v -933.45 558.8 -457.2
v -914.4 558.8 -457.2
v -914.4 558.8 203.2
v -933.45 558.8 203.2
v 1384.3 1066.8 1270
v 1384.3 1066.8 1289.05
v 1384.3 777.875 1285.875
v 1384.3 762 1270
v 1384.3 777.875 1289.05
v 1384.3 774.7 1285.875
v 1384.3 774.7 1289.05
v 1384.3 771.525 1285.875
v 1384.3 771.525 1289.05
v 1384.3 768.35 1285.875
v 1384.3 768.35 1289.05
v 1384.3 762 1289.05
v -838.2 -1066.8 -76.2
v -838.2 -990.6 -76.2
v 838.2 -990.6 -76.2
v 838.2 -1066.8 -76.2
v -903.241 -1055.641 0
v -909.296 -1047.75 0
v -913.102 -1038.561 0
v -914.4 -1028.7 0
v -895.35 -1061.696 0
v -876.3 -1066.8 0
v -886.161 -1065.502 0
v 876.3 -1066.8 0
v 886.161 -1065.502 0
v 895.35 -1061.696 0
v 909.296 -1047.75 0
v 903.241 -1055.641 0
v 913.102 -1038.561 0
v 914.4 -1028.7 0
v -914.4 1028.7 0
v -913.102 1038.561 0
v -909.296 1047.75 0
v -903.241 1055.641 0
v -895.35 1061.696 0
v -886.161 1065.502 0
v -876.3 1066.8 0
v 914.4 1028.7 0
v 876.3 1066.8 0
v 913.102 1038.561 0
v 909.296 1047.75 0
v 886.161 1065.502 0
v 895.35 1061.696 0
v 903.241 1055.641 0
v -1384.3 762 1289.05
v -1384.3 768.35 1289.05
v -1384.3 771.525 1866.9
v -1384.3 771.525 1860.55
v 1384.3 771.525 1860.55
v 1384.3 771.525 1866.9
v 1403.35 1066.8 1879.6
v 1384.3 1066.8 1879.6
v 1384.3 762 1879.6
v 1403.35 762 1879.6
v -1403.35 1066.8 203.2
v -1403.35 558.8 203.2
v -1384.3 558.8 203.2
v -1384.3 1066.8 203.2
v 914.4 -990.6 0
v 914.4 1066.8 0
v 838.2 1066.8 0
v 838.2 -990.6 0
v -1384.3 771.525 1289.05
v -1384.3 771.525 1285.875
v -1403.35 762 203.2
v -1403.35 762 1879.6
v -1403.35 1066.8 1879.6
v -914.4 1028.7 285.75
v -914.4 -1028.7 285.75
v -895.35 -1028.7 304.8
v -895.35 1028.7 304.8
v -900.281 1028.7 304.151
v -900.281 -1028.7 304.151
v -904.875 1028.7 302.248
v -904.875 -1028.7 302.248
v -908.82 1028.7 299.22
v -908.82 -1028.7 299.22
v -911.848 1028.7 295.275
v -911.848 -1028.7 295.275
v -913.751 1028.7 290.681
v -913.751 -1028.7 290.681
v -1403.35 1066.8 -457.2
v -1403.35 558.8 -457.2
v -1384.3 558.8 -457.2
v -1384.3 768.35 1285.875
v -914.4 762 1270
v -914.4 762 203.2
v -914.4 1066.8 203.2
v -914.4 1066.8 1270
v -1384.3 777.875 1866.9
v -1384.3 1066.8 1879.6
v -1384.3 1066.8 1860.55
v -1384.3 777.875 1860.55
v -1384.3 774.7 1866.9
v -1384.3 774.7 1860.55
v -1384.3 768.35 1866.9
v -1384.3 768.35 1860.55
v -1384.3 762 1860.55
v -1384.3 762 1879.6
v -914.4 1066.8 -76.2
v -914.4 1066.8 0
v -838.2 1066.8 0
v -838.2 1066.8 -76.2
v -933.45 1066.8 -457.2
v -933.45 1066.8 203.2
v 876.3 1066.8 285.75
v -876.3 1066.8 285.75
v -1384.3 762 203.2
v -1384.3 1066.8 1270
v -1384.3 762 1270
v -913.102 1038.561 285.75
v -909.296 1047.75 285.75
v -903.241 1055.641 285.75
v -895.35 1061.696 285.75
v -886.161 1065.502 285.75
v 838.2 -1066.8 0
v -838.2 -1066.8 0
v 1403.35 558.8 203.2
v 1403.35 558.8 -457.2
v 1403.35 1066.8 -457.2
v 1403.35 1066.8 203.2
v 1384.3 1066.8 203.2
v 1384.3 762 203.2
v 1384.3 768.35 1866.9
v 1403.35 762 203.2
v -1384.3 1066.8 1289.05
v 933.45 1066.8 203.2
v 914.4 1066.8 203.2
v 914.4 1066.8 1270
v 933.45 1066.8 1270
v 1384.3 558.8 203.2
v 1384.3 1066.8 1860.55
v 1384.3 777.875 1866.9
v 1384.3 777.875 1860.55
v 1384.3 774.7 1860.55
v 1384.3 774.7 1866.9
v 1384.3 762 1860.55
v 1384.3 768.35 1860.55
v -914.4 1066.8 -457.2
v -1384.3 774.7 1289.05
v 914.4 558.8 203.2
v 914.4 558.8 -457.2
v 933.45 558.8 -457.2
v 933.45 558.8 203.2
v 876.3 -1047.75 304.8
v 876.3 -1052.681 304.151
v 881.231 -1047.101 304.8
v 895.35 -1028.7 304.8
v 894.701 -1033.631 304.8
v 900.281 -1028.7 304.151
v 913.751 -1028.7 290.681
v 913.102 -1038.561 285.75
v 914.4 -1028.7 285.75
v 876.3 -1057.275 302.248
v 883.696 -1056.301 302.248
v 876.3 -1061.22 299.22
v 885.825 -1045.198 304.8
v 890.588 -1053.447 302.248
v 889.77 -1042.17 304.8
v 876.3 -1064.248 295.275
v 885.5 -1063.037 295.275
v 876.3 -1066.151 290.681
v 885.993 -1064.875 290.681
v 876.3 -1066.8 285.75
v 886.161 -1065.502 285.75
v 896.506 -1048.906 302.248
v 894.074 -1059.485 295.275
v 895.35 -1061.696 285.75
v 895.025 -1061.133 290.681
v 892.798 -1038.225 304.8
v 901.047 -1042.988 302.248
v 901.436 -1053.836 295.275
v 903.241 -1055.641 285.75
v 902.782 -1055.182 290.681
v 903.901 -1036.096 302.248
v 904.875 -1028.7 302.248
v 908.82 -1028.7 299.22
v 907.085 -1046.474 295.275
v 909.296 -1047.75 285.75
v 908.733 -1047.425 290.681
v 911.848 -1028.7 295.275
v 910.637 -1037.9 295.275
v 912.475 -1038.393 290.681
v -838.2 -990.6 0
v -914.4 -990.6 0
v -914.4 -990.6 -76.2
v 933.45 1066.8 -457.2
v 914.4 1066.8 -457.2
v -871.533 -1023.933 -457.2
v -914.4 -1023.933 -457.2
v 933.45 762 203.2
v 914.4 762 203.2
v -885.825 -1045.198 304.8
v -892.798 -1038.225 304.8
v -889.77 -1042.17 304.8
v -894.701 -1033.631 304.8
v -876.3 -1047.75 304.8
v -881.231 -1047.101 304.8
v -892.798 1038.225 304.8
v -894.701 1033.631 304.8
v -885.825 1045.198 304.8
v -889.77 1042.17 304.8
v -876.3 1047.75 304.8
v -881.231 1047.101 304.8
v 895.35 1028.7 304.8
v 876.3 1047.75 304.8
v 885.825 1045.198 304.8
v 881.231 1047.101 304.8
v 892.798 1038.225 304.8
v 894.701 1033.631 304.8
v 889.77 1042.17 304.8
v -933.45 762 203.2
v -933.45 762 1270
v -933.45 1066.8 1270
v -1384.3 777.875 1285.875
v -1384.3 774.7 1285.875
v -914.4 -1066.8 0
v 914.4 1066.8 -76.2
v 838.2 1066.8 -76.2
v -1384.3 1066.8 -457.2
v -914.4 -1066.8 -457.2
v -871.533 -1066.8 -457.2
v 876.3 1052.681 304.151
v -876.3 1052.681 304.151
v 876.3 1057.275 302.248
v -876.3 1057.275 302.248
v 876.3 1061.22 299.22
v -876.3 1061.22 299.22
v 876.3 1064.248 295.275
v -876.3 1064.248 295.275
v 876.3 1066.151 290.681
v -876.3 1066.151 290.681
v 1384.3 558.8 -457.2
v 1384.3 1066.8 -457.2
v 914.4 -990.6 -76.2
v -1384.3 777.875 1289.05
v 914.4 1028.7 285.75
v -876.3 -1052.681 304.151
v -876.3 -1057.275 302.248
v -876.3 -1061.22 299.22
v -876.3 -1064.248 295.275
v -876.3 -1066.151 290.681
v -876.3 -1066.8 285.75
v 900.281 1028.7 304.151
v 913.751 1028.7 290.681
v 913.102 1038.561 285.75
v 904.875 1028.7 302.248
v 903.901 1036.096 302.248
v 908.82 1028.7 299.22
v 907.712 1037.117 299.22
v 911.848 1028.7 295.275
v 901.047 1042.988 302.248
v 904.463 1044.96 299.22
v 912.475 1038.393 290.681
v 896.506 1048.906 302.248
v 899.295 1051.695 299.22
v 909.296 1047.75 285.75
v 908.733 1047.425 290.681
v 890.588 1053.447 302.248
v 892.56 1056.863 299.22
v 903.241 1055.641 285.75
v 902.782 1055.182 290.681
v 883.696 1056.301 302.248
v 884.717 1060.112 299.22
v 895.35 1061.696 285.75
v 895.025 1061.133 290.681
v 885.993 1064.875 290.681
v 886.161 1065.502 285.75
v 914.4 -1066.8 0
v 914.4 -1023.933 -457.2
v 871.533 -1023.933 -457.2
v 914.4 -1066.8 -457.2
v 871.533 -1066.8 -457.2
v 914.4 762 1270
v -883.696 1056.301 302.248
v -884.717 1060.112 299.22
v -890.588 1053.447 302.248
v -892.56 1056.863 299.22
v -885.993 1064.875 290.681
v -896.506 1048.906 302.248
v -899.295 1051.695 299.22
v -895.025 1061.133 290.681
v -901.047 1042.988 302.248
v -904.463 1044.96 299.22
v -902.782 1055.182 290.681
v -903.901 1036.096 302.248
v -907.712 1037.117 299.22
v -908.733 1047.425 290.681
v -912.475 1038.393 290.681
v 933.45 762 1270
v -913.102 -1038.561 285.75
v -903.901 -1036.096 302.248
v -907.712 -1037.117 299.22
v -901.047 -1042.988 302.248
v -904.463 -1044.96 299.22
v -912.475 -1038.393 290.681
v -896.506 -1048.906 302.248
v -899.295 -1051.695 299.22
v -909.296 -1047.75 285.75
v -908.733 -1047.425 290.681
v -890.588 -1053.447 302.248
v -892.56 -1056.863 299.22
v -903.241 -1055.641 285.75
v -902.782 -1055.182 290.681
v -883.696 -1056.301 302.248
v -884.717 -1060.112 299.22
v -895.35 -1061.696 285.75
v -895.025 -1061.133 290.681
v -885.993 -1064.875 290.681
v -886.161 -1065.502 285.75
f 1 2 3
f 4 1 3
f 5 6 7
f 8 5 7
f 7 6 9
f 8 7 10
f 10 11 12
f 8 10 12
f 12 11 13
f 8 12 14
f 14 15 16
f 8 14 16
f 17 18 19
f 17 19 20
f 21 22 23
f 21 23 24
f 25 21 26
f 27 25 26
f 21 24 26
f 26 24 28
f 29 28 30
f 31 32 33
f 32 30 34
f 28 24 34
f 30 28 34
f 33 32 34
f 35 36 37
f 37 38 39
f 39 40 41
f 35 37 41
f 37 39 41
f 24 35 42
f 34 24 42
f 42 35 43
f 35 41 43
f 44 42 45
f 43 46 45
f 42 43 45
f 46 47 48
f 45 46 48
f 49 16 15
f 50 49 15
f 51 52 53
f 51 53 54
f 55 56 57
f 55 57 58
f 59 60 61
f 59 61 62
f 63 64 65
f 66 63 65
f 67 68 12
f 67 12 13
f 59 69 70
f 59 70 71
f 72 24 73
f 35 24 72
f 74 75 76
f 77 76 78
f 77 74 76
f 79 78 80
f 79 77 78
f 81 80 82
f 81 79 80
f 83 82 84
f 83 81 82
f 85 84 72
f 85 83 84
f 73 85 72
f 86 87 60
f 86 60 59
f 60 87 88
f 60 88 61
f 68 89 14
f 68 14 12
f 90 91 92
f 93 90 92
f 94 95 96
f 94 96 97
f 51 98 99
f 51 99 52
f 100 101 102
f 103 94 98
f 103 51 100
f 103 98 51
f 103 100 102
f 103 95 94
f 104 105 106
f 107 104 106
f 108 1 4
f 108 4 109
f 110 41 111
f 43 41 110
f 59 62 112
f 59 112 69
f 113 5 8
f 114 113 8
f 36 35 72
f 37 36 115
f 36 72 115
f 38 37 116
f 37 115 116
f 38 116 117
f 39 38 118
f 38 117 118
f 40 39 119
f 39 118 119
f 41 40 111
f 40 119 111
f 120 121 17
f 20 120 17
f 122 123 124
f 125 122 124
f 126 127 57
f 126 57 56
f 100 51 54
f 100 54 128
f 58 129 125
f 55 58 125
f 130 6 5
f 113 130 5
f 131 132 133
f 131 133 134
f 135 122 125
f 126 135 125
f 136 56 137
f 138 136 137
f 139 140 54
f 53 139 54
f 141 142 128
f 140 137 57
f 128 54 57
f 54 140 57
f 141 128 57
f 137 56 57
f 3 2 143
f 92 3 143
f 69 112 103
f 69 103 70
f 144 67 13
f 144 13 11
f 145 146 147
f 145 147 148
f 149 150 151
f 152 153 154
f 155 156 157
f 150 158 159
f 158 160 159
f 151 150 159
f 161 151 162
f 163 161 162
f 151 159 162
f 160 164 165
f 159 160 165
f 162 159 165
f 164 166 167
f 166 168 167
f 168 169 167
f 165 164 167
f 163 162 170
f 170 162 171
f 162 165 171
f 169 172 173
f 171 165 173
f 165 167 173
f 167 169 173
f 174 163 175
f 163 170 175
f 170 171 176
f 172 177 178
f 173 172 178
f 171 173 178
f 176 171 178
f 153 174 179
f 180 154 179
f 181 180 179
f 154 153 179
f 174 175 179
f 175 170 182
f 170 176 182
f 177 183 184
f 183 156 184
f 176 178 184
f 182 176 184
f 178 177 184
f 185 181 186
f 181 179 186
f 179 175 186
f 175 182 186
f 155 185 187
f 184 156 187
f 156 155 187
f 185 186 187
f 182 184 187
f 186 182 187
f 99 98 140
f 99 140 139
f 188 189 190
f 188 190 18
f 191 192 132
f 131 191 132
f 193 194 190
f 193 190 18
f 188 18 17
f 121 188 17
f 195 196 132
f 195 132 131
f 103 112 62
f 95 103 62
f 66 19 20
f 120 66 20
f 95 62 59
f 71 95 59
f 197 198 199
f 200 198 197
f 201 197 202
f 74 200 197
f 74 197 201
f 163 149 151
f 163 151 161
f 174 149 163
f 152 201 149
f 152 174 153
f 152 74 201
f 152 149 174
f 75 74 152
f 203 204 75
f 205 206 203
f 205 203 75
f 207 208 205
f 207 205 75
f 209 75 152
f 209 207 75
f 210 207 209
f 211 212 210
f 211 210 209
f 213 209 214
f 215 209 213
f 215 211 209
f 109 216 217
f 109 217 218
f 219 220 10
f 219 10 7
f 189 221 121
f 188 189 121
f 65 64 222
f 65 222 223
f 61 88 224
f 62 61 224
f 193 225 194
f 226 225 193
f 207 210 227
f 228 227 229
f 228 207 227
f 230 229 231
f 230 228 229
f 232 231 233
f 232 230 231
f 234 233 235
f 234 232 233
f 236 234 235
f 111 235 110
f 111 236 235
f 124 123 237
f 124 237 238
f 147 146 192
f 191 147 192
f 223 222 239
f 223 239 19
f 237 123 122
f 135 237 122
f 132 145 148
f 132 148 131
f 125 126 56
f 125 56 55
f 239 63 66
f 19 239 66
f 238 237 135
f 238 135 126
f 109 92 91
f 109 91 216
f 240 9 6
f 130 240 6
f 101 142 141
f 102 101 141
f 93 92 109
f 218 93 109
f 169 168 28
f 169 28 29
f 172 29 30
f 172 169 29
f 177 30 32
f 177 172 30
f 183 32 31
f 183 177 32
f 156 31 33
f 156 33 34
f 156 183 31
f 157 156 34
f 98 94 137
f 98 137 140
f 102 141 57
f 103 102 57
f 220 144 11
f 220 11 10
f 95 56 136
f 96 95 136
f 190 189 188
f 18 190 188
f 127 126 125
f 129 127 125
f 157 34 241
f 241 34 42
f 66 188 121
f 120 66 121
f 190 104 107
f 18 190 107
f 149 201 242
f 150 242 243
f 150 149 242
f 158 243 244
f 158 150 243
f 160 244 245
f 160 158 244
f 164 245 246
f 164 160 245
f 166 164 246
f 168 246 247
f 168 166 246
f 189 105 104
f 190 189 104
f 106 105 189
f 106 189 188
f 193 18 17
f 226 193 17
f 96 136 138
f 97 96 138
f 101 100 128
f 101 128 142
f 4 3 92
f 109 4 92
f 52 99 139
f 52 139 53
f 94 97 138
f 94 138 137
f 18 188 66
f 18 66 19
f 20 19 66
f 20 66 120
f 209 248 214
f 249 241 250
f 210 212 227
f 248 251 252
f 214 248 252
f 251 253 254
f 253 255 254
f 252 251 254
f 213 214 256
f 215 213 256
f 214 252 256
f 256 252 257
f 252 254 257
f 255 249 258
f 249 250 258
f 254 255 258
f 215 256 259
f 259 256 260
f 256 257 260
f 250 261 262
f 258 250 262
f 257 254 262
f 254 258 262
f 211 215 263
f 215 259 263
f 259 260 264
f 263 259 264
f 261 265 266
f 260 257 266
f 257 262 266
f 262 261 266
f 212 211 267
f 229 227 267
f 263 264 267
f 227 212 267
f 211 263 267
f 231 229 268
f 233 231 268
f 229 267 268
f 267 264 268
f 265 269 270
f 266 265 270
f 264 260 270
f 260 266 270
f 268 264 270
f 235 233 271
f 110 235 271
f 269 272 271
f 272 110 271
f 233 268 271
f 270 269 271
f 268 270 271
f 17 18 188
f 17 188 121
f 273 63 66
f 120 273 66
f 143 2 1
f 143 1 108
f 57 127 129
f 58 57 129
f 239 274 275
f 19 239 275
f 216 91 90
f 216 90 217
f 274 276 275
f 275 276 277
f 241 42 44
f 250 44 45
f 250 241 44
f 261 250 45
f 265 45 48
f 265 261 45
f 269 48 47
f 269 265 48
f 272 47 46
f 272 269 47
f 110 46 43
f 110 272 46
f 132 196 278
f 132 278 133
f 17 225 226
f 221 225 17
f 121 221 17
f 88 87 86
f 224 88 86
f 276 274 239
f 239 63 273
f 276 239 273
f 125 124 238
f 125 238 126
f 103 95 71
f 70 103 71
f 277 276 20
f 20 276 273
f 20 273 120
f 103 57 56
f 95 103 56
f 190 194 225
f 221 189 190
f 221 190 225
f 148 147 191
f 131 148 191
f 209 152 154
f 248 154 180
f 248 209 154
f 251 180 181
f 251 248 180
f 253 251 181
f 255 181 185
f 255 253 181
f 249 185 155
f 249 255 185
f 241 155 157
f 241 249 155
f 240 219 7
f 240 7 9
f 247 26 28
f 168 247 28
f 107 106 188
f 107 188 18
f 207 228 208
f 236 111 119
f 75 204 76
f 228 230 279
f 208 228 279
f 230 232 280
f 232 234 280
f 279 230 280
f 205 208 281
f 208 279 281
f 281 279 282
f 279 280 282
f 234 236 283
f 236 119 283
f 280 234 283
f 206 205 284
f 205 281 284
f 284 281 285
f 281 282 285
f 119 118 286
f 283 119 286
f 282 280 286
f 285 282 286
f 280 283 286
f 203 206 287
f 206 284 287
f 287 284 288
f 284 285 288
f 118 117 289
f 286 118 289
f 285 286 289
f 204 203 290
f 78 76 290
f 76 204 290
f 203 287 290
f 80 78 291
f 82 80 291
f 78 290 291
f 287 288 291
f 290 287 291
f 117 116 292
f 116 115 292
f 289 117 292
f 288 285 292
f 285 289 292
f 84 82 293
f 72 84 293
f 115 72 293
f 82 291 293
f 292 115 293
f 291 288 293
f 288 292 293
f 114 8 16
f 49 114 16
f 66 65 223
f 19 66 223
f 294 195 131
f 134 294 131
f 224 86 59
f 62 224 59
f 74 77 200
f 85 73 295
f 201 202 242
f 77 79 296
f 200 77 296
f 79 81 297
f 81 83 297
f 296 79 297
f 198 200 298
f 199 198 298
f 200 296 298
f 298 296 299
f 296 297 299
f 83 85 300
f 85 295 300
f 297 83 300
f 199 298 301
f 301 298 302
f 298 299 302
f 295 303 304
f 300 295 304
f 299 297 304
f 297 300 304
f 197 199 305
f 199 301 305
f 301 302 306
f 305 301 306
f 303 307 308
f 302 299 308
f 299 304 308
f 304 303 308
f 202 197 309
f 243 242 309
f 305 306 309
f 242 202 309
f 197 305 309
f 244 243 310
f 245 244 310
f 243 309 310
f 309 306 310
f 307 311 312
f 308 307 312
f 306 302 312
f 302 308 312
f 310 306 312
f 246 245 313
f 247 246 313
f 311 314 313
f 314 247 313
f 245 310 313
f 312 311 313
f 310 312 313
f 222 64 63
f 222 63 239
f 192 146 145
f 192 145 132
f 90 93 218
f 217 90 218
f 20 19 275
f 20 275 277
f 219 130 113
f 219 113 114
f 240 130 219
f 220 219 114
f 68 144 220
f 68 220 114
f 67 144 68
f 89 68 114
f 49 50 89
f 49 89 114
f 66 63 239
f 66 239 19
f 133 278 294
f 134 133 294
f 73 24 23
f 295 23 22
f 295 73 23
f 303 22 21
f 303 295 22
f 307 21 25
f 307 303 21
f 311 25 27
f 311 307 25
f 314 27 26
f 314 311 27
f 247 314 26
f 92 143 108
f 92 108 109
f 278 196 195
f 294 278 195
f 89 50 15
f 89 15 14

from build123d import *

# Parameters (mm, degrees)
F0_W      = 1828.8
F0_H      = 2133.6
F1_DEPTH  = 304.8
F2_R      = 38.1
F3_R      = 19.05
F5_W      = 76.2
F5_H      = 76.2
F6_DEPTH  = 457.2
F7_SIZE2  = 33.3331808034
F7_SIZE   = 381
F9_DEPTH  = 1676.4
F10_DEPTH = 2057.4
F11_W     = 508
F11_H     = 660.4
F12_DEPTH = 19.05
F15_W     = 19.05
F15_H     = 304.8
F16_DEPTH = 1676.4
F17_DEPTH = 1066.8
F20_DEPTH = 2768.6


with BuildPart() as f1:
    # F0 (on Top) → F1 (new body)
    with BuildSketch(Plane.XY):
        Rectangle(F0_W, F0_H)
    extrude(amount=F1_DEPTH)

    # F2
    f2_edges = [f1.edges().sort_by_distance(p)[0] for p in [
        (-914.4, -1066.8, 152.4),
        (914.4, -1066.8, 152.4),
        (914.4, 1066.8, 152.4),
        (-914.4, 1066.8, 152.4),
    ]]
    fillet(f2_edges, radius=F2_R)

    # F3
    f3_edges = [f1.edges().sort_by_distance(p)[0] for p in [
        (914.4, 0, 304.8),
        (903.240768, -1055.640768, 304.8),
        (903.240768, 1055.640768, 304.8),
        (0, -1066.8, 304.8),
        (0, 1066.8, 304.8),
        (-903.240768, -1055.640768, 304.8),
        (-903.240768, 1055.640768, 304.8),
        (-914.4, 0, 304.8),
    ]]
    fillet(f3_edges, radius=F3_R)


with BuildPart() as f6:
    # F5 (on face) → F6 (new body)
    with BuildSketch(Plane(origin=(0, 0, 0), x_dir=(1, 0, 0), z_dir=(0, 0, -1))):
        with Locations((-876.3, 1028.7)):
            Rectangle(F5_W, F5_H)
    extrude(amount=F6_DEPTH)

    # F7
    f7_edges = [f6.edges().sort_by_distance(p)[0] for p in [
        (-876.3, -990.6, -457.2),
        (-838.2, -1028.7, -457.2),
    ]]
    chamfer(f7_edges, length=F7_SIZE, length2=F7_SIZE2)


with BuildPart() as f8_1:
    # F8: instance of F6
    add(f6.part.mirror(Plane.YZ))


with BuildPart() as f9:
    # F9 (new, through all): a face of the model
    f9_faces = [f6.part.faces().sort_by_distance(p)[0] for p in [
        (-838.2, -1028.7, -38.1),
    ]]
    extrude(f9_faces, amount=F9_DEPTH)


with BuildPart() as f10:
    # F10 (new, through all): a face of the model
    f10_faces = [f8_1.part.faces().sort_by_distance(p)[0] for p in [
        (876.3, -990.6, -38.1),
    ]]
    extrude(f10_faces, amount=F10_DEPTH)


with BuildPart() as f10b:
    # F10#2 (new, through all): a face of the model
    f10_2_faces = [f6.part.faces().sort_by_distance(p)[0] for p in [
        (-876.3, -990.6, -38.1),
    ]]
    extrude(f10_2_faces, amount=F10_DEPTH)


with BuildPart() as f12:
    # F11 (on face) → F12 (new body)
    with BuildSketch(Plane.YZ.offset(914.4)):
        with Locations((812.8, -127)):
            Rectangle(F11_W, F11_H)
    extrude(amount=F12_DEPTH)


with BuildPart() as f14_1:
    # F14: instance of F12
    add(f12.part.mirror(Plane(origin=(1158.875, 812.8, -127), x_dir=(0, 1, 0), z_dir=(1, 0, 0))))


with BuildPart() as f16:
    # F15 (on face) → F16 (new body)
    with BuildSketch(Plane.XY.offset(203.2)):
        with Locations((1393.825, 914.4)):
            Rectangle(F15_W, F15_H)
    extrude(amount=F16_DEPTH)


with BuildPart() as f17:
    # F15 (on face) → F17 (new body, through all)
    with BuildSketch(Plane.XY.offset(203.2)):
        with Locations((923.925, 914.4)):
            Rectangle(F15_W, F15_H)
    extrude(amount=F17_DEPTH)


with BuildPart() as f18_1:
    # F18: instance of F12
    add(f12.part.mirror(Plane.YZ))


with BuildPart() as f18_2:
    # F18: instance of F16
    add(f16.part.mirror(Plane.YZ))


with BuildPart() as f18_3:
    # F18: instance of F14_1
    add(f14_1.part.mirror(Plane.YZ))


with BuildPart() as f18_4:
    # F18: instance of F17
    add(f17.part.mirror(Plane.YZ))


with BuildPart() as f20:
    # F19 (on face) → F20 (new body, through all)
    with BuildSketch(Plane(origin=(1384.3, 0, 0), x_dir=(0, -1, 0), z_dir=(-1, 0, 0))):
        Polygon((-762, 1879.6), (-1066.8, 1879.6), (-1066.8, 1860.55), (-777.875, 1860.55), (-777.875, 1866.9), (-774.7, 1866.9), (-774.7, 1860.55), (-771.525, 1860.55), (-771.525, 1866.9), (-768.35, 1866.9), (-768.35, 1860.55), (-762, 1860.55), align=None)
    extrude(amount=F20_DEPTH)


with BuildPart() as f20b:
    # F19 (on face) → F20, piece 2 (new body, through all)
    with BuildSketch(Plane(origin=(1384.3, 0, 0), x_dir=(0, -1, 0), z_dir=(-1, 0, 0))):
        Polygon((-777.875, 1289.05), (-1066.8, 1289.05), (-1066.8, 1270), (-762, 1270), (-762, 1289.05), (-768.35, 1289.05), (-768.35, 1285.875), (-771.525, 1285.875), (-771.525, 1289.05), (-774.7, 1289.05), (-774.7, 1285.875), (-777.875, 1285.875), align=None)
    extrude(amount=F20_DEPTH)


solid = Compound([f1.part, f6.part, f8_1.part, f9.part, f10.part, f10b.part, f12.part, f14_1.part, f16.part, f17.part, f18_1.part, f18_2.part, f18_3.part, f18_4.part, f20.part, f20b.part])
